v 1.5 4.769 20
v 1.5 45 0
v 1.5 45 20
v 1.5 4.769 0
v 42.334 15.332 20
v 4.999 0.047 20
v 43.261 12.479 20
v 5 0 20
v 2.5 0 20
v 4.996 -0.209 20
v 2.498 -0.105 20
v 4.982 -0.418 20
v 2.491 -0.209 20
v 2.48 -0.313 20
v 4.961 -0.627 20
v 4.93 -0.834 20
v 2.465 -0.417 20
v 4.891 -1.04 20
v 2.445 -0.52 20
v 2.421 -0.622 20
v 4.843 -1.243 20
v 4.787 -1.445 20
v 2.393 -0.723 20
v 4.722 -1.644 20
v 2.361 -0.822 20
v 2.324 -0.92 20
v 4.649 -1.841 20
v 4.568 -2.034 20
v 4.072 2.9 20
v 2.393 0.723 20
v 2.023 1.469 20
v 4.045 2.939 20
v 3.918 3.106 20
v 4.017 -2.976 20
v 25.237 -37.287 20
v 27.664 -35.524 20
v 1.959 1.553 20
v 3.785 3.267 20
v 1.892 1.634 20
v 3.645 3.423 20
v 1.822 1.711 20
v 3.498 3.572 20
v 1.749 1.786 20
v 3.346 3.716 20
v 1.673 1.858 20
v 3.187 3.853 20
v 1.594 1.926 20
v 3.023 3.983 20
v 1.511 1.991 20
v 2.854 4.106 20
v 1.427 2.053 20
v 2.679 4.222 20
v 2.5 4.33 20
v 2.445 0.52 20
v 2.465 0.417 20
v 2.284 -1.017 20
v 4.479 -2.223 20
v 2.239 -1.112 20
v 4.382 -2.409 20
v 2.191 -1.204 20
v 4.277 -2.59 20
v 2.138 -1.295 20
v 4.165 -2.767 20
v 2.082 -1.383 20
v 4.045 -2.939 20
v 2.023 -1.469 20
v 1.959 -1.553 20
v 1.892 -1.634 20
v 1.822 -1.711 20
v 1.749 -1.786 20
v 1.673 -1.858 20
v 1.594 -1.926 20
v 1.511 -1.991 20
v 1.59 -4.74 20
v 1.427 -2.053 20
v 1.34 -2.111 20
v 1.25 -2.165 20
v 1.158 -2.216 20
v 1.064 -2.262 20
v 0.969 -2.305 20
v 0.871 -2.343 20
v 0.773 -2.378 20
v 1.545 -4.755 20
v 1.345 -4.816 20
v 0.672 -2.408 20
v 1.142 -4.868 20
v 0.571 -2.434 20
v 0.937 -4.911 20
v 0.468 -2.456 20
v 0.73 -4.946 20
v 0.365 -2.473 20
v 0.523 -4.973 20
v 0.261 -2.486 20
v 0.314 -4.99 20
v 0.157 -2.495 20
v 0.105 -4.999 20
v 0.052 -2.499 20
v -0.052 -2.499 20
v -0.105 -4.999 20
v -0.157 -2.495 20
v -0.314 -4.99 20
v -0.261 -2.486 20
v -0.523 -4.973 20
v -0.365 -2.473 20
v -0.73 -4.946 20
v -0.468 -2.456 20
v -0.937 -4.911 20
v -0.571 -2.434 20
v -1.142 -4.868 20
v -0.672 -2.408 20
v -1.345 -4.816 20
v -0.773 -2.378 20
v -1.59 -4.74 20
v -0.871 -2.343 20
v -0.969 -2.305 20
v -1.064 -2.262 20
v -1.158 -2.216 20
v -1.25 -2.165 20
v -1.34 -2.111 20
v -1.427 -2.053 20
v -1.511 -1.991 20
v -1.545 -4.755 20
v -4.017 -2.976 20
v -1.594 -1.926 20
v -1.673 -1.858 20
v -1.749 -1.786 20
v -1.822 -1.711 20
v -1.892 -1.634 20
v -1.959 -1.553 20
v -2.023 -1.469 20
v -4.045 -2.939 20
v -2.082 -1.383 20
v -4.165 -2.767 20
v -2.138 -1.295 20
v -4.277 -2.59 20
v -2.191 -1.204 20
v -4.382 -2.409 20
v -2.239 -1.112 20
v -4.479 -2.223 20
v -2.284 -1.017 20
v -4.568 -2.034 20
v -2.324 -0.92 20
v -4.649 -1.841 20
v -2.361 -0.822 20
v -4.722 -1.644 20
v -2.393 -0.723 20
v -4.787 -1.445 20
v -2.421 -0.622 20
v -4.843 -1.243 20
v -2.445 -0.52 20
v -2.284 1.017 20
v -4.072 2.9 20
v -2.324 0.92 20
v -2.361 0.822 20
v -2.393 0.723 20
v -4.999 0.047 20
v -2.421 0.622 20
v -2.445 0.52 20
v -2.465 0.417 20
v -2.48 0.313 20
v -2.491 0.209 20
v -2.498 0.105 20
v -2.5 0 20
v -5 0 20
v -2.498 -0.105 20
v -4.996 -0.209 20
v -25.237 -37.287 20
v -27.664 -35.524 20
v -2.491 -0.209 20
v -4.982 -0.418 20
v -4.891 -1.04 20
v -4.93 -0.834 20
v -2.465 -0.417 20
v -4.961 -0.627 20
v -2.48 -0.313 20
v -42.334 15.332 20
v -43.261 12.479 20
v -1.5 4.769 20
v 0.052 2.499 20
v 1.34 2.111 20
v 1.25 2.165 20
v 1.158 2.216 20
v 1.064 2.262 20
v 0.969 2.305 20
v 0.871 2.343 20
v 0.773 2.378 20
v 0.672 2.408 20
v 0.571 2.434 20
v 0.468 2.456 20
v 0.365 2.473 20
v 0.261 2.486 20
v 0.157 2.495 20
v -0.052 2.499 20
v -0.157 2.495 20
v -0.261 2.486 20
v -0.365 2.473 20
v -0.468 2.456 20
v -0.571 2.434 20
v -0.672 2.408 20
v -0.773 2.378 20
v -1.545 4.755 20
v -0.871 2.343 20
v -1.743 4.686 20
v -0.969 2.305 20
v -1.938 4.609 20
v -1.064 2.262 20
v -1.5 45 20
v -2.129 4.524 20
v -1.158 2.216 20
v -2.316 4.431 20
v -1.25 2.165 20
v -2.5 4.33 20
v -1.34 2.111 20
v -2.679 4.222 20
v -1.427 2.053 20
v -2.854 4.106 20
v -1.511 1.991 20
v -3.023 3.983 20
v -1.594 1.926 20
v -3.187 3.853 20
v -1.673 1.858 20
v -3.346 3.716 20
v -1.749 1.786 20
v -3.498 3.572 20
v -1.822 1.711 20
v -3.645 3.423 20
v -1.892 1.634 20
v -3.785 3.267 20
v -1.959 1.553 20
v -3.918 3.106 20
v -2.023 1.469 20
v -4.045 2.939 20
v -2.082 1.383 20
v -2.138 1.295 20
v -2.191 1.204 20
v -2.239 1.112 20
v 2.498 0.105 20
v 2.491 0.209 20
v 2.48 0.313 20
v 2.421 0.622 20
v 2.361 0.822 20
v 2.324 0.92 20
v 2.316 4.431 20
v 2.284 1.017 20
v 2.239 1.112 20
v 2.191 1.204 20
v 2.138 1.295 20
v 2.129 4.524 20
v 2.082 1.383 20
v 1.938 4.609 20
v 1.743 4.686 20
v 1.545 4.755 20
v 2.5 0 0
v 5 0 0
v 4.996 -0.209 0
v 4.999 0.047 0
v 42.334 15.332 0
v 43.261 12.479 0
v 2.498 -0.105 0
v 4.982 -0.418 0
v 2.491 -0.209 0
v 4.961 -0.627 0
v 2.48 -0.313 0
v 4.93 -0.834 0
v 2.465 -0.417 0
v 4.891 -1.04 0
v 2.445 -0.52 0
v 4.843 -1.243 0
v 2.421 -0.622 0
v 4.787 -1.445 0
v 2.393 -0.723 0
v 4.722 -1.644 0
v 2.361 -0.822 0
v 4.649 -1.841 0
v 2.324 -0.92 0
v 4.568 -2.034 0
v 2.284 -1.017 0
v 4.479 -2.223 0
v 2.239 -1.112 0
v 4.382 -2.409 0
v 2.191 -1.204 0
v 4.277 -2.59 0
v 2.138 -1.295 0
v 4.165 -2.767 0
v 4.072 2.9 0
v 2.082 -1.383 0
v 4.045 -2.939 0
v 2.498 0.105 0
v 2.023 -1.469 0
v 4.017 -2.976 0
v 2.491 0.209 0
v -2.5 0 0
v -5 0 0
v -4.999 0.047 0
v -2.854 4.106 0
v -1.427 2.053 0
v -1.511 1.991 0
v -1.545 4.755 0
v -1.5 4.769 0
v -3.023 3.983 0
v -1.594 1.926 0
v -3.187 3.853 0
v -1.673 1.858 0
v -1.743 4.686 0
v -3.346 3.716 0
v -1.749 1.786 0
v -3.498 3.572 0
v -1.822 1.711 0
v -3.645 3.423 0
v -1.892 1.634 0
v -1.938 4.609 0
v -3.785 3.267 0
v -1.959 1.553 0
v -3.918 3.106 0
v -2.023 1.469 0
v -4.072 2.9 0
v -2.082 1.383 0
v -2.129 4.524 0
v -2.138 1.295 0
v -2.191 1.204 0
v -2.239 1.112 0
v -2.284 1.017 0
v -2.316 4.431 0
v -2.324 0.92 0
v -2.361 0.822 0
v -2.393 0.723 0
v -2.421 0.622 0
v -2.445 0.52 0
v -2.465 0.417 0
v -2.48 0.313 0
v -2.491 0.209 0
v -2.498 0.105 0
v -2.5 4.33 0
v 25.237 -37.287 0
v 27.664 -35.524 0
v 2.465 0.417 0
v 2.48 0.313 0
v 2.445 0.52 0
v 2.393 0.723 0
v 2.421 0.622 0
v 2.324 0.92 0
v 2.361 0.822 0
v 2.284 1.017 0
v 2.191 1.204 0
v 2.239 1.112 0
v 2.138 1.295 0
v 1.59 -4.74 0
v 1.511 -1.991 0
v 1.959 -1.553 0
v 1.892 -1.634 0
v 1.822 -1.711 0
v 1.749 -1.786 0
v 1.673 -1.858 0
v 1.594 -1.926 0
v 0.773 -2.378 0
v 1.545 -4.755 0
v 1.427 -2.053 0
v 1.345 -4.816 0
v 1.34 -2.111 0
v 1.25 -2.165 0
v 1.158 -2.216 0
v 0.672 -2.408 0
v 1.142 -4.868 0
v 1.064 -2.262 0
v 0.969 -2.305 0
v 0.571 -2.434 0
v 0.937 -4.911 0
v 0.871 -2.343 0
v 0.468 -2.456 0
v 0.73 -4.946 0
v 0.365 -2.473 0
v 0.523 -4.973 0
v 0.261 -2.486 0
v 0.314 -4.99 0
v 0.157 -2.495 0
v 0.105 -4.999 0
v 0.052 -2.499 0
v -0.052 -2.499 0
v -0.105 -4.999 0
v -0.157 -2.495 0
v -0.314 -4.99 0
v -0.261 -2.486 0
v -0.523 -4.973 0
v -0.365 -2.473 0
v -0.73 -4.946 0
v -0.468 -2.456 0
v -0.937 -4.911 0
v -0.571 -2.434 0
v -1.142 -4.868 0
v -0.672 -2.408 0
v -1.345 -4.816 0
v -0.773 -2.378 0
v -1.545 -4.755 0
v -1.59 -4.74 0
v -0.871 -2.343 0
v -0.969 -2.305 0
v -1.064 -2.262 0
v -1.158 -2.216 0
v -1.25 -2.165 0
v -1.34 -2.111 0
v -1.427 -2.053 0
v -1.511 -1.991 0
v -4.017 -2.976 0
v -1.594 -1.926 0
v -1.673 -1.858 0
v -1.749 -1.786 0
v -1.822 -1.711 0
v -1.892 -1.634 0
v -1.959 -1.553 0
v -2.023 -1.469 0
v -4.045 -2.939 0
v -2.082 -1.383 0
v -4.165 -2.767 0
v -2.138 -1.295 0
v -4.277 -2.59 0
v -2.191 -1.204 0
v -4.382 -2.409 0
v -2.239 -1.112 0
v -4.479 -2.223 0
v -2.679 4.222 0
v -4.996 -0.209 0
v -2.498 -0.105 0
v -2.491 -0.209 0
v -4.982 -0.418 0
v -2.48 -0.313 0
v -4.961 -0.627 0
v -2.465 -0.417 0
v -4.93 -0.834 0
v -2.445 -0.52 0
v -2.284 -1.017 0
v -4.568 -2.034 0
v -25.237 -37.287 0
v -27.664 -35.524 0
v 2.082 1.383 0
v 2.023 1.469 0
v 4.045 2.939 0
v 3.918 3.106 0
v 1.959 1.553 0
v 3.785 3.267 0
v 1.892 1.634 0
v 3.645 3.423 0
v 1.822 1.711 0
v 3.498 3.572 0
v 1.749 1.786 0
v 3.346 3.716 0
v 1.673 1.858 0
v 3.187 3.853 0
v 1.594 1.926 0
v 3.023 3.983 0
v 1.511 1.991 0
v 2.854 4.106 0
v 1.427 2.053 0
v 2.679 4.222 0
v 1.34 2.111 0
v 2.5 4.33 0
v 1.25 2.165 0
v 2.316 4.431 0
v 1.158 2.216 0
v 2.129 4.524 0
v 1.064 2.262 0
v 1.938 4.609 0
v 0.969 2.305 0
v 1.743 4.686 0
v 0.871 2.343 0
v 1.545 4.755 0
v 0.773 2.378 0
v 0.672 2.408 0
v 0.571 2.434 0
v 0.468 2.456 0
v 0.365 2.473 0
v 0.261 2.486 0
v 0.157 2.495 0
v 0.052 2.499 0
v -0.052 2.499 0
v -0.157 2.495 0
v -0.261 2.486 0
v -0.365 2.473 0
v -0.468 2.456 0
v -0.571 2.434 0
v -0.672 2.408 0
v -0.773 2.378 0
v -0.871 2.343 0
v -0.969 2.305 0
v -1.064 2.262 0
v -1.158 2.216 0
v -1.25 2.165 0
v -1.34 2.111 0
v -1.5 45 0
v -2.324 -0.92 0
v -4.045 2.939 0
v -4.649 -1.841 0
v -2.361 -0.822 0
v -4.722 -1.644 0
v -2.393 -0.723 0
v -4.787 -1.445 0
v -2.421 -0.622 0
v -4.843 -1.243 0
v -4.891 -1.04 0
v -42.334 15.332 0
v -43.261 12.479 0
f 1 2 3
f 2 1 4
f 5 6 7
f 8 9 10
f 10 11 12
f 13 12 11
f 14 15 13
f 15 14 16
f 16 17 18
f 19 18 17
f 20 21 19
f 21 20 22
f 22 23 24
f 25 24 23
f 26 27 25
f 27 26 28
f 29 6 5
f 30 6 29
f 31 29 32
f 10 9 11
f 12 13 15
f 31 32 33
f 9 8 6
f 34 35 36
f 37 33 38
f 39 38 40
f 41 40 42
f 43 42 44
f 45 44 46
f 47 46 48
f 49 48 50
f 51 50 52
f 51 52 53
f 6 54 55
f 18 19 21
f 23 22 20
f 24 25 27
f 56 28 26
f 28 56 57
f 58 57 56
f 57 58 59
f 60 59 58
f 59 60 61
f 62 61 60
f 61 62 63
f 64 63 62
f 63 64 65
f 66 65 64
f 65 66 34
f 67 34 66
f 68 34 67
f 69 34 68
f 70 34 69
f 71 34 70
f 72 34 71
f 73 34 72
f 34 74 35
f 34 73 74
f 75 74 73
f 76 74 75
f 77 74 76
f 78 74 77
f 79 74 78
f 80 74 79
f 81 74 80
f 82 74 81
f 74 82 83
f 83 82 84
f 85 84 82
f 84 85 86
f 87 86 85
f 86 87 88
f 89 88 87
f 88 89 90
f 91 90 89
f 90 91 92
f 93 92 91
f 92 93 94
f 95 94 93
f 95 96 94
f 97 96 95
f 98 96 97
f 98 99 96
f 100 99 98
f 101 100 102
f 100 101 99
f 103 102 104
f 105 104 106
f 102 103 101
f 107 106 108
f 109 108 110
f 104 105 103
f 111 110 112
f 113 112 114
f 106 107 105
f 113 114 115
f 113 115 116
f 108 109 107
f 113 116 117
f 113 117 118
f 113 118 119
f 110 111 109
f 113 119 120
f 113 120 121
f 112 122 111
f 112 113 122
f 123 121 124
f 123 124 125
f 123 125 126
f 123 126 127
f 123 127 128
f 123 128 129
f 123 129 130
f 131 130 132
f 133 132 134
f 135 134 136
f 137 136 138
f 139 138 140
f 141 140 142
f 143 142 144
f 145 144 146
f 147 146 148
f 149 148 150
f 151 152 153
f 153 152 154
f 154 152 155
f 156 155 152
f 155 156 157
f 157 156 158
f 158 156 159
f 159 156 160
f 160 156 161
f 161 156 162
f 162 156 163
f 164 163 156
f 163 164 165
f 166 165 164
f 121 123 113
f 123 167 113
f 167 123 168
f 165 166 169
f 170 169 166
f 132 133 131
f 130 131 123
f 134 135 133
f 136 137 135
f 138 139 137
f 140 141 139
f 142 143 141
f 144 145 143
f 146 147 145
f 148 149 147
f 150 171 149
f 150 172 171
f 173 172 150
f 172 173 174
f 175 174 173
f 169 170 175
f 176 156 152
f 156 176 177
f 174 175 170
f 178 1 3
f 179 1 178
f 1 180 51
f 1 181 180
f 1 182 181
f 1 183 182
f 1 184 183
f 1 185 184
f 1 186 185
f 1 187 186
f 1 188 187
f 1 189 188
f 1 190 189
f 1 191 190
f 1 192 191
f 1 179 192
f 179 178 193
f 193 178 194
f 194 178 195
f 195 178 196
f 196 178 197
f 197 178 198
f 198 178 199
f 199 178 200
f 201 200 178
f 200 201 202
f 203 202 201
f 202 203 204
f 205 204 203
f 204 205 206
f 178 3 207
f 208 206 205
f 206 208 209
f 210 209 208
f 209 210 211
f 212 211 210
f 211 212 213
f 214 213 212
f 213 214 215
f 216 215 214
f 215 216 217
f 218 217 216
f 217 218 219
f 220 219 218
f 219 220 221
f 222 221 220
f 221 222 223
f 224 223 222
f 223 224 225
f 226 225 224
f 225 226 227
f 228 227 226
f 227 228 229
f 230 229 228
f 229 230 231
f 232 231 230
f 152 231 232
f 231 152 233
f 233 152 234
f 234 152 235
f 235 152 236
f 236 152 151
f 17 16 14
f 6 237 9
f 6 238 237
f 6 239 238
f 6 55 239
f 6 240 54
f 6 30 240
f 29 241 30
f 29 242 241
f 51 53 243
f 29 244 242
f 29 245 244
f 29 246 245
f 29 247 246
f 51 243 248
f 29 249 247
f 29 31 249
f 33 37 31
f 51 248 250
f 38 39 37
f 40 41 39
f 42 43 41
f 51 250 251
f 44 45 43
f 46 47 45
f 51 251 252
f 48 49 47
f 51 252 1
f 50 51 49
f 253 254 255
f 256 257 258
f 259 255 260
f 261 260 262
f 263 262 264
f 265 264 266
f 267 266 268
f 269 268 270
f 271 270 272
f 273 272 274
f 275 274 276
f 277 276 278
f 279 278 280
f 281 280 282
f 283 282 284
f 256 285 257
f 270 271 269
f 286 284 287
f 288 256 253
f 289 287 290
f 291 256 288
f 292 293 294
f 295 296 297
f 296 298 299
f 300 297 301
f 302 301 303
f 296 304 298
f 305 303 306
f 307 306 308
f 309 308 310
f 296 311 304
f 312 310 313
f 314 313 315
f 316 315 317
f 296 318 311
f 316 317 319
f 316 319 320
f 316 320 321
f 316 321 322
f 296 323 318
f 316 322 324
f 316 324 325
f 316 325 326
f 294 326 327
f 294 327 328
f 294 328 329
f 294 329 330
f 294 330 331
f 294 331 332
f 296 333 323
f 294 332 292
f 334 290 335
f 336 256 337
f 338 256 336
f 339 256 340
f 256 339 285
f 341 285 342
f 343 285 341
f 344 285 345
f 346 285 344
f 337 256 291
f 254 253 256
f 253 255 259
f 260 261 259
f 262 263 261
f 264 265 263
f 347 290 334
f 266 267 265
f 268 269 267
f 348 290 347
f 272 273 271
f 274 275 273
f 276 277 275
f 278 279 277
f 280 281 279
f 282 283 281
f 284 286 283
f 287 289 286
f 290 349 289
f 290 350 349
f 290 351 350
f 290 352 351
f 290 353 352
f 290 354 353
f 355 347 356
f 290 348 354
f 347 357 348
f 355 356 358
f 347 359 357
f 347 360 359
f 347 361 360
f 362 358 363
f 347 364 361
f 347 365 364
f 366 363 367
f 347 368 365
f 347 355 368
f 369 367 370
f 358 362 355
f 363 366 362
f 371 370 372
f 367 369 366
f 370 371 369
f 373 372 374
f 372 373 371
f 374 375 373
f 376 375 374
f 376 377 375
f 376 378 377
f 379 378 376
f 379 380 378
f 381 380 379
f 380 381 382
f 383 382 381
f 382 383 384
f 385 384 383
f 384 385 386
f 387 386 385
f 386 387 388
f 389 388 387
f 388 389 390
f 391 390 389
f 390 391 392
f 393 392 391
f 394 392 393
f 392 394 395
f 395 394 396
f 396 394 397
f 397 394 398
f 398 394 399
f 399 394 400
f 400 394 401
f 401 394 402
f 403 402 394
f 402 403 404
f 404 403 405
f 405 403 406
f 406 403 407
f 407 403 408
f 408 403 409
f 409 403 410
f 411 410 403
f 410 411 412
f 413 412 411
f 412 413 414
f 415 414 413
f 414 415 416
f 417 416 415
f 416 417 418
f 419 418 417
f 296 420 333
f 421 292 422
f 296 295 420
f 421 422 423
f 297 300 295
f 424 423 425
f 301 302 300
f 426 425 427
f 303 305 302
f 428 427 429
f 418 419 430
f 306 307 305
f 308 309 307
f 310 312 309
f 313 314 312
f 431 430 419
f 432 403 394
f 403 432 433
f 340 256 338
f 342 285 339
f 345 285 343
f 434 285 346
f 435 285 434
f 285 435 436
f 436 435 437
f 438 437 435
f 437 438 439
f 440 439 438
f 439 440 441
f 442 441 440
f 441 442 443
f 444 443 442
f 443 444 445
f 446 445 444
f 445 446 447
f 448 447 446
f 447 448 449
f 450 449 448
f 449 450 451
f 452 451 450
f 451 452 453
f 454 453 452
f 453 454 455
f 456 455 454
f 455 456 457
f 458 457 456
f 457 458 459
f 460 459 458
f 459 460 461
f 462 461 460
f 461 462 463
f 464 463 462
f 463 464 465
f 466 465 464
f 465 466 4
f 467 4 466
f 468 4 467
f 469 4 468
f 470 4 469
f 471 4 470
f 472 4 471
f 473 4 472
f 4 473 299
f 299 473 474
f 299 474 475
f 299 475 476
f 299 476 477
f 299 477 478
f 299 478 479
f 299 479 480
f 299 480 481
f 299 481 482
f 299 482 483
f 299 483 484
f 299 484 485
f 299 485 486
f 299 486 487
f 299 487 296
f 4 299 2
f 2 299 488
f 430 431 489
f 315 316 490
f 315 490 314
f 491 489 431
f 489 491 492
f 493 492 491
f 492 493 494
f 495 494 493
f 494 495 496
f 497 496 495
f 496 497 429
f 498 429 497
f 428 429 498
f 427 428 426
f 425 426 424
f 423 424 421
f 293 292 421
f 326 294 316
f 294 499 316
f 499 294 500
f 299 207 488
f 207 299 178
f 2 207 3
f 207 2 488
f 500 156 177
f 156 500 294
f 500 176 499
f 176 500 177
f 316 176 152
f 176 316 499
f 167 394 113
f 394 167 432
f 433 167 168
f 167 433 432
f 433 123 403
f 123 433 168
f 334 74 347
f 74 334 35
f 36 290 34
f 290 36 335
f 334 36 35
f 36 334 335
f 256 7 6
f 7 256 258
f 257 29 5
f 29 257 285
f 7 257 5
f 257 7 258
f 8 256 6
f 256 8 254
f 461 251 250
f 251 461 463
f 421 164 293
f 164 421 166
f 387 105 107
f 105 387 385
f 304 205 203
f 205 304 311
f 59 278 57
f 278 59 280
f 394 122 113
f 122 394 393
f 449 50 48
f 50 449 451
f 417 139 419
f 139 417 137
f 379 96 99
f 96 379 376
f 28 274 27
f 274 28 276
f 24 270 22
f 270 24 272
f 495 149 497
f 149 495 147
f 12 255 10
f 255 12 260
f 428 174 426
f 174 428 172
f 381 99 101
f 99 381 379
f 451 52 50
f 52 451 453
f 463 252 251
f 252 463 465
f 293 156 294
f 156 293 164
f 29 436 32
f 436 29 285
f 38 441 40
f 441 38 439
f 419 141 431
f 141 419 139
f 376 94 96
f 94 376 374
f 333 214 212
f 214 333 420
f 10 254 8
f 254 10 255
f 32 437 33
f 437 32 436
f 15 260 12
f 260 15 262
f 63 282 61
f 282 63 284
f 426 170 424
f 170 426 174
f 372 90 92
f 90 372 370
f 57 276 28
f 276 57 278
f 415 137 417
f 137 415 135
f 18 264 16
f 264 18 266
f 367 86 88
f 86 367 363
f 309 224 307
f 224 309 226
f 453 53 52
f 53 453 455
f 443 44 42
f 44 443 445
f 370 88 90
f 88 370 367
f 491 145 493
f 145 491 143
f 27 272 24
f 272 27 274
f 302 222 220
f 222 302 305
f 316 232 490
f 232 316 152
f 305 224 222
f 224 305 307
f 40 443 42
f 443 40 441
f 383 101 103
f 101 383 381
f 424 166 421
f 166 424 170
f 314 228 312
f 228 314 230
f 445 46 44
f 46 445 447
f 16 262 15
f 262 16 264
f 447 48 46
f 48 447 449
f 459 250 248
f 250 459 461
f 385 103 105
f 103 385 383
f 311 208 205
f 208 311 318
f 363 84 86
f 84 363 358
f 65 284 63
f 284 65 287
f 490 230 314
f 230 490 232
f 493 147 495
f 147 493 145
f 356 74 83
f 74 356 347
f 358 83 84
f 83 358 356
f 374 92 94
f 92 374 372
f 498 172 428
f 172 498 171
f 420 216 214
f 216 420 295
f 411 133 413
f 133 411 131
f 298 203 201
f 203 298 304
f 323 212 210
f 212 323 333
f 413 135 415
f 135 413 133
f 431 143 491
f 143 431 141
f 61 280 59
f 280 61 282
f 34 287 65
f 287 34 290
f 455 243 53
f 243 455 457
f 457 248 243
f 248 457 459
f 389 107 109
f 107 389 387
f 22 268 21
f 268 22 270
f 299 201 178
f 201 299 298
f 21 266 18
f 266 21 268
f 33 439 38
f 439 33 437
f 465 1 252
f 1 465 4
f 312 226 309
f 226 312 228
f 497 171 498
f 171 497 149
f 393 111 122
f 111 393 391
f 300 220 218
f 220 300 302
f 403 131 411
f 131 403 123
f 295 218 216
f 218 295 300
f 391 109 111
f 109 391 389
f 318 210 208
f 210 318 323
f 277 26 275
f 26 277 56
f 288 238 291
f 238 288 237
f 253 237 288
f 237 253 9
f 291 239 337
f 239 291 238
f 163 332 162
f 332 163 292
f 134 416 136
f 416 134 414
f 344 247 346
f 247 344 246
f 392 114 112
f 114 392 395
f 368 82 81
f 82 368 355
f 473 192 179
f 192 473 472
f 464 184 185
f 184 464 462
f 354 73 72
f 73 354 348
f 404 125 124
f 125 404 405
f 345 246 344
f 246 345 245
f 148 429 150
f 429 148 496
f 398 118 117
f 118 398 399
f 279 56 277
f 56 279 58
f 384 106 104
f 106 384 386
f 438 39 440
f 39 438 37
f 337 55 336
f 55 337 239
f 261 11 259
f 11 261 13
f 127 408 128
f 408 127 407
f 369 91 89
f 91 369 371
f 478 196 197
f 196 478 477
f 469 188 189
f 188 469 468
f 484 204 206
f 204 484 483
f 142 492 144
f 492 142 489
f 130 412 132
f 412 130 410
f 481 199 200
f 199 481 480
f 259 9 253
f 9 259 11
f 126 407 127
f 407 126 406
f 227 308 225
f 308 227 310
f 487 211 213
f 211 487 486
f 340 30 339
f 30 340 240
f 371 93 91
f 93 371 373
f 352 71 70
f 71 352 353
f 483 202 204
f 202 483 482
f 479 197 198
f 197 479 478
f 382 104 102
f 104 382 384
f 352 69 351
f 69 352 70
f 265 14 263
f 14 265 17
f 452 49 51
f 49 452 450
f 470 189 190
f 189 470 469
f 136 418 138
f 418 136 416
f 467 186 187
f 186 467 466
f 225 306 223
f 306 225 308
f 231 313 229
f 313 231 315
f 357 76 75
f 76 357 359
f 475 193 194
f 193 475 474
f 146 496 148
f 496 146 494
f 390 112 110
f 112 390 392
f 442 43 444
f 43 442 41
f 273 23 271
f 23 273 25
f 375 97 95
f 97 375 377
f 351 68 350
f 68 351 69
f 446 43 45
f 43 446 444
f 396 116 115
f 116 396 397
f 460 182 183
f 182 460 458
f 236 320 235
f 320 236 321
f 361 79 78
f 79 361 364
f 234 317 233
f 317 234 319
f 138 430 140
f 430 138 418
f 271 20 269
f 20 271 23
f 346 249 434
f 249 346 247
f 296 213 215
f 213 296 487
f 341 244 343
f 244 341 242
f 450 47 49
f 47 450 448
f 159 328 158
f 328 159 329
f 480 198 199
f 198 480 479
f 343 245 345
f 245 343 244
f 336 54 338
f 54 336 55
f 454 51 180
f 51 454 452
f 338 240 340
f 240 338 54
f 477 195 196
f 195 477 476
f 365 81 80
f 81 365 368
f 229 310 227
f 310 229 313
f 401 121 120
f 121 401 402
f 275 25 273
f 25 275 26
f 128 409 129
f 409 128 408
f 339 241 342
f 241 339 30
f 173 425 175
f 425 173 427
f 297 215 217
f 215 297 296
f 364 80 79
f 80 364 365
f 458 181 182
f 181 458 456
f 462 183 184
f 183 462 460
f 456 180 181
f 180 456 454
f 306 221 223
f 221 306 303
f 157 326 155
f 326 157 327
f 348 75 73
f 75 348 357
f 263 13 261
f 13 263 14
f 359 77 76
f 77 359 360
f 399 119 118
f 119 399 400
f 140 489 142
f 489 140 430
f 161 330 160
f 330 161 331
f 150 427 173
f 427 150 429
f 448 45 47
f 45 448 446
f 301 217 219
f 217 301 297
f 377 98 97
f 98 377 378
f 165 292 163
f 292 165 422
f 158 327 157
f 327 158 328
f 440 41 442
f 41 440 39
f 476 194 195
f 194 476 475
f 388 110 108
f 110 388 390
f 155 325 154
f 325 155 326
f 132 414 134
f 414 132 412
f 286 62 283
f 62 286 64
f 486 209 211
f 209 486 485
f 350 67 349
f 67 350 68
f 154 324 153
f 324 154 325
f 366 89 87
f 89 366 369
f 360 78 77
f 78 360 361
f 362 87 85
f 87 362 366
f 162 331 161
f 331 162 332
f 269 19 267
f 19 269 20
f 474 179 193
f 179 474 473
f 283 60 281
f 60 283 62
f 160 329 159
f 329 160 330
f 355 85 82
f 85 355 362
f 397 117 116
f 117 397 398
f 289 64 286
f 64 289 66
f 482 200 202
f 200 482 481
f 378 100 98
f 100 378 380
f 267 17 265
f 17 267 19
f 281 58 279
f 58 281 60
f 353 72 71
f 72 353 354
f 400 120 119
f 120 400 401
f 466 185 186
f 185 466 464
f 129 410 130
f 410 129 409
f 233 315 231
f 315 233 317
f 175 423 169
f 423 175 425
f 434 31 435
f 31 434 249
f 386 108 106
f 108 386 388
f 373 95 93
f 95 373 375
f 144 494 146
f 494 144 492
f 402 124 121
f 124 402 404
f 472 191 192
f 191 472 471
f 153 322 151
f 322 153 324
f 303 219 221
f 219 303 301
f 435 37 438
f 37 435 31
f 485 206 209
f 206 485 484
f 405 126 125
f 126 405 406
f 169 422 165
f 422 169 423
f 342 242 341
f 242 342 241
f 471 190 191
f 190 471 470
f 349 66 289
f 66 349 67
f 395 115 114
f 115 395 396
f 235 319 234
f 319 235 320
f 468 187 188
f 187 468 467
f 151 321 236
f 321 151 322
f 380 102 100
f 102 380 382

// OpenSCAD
$fn=150;
module pale() {
	translate([-1.5,0,0])cube([3,45,20]);
}

module pales() {
union() {
	for	 (i=[0:4]) {rotate([0,0,i*360/5])pale();}
	cylinder(20,d=10);
}
}


difference(){
	pales();
	cylinder(20, d=5);
}
